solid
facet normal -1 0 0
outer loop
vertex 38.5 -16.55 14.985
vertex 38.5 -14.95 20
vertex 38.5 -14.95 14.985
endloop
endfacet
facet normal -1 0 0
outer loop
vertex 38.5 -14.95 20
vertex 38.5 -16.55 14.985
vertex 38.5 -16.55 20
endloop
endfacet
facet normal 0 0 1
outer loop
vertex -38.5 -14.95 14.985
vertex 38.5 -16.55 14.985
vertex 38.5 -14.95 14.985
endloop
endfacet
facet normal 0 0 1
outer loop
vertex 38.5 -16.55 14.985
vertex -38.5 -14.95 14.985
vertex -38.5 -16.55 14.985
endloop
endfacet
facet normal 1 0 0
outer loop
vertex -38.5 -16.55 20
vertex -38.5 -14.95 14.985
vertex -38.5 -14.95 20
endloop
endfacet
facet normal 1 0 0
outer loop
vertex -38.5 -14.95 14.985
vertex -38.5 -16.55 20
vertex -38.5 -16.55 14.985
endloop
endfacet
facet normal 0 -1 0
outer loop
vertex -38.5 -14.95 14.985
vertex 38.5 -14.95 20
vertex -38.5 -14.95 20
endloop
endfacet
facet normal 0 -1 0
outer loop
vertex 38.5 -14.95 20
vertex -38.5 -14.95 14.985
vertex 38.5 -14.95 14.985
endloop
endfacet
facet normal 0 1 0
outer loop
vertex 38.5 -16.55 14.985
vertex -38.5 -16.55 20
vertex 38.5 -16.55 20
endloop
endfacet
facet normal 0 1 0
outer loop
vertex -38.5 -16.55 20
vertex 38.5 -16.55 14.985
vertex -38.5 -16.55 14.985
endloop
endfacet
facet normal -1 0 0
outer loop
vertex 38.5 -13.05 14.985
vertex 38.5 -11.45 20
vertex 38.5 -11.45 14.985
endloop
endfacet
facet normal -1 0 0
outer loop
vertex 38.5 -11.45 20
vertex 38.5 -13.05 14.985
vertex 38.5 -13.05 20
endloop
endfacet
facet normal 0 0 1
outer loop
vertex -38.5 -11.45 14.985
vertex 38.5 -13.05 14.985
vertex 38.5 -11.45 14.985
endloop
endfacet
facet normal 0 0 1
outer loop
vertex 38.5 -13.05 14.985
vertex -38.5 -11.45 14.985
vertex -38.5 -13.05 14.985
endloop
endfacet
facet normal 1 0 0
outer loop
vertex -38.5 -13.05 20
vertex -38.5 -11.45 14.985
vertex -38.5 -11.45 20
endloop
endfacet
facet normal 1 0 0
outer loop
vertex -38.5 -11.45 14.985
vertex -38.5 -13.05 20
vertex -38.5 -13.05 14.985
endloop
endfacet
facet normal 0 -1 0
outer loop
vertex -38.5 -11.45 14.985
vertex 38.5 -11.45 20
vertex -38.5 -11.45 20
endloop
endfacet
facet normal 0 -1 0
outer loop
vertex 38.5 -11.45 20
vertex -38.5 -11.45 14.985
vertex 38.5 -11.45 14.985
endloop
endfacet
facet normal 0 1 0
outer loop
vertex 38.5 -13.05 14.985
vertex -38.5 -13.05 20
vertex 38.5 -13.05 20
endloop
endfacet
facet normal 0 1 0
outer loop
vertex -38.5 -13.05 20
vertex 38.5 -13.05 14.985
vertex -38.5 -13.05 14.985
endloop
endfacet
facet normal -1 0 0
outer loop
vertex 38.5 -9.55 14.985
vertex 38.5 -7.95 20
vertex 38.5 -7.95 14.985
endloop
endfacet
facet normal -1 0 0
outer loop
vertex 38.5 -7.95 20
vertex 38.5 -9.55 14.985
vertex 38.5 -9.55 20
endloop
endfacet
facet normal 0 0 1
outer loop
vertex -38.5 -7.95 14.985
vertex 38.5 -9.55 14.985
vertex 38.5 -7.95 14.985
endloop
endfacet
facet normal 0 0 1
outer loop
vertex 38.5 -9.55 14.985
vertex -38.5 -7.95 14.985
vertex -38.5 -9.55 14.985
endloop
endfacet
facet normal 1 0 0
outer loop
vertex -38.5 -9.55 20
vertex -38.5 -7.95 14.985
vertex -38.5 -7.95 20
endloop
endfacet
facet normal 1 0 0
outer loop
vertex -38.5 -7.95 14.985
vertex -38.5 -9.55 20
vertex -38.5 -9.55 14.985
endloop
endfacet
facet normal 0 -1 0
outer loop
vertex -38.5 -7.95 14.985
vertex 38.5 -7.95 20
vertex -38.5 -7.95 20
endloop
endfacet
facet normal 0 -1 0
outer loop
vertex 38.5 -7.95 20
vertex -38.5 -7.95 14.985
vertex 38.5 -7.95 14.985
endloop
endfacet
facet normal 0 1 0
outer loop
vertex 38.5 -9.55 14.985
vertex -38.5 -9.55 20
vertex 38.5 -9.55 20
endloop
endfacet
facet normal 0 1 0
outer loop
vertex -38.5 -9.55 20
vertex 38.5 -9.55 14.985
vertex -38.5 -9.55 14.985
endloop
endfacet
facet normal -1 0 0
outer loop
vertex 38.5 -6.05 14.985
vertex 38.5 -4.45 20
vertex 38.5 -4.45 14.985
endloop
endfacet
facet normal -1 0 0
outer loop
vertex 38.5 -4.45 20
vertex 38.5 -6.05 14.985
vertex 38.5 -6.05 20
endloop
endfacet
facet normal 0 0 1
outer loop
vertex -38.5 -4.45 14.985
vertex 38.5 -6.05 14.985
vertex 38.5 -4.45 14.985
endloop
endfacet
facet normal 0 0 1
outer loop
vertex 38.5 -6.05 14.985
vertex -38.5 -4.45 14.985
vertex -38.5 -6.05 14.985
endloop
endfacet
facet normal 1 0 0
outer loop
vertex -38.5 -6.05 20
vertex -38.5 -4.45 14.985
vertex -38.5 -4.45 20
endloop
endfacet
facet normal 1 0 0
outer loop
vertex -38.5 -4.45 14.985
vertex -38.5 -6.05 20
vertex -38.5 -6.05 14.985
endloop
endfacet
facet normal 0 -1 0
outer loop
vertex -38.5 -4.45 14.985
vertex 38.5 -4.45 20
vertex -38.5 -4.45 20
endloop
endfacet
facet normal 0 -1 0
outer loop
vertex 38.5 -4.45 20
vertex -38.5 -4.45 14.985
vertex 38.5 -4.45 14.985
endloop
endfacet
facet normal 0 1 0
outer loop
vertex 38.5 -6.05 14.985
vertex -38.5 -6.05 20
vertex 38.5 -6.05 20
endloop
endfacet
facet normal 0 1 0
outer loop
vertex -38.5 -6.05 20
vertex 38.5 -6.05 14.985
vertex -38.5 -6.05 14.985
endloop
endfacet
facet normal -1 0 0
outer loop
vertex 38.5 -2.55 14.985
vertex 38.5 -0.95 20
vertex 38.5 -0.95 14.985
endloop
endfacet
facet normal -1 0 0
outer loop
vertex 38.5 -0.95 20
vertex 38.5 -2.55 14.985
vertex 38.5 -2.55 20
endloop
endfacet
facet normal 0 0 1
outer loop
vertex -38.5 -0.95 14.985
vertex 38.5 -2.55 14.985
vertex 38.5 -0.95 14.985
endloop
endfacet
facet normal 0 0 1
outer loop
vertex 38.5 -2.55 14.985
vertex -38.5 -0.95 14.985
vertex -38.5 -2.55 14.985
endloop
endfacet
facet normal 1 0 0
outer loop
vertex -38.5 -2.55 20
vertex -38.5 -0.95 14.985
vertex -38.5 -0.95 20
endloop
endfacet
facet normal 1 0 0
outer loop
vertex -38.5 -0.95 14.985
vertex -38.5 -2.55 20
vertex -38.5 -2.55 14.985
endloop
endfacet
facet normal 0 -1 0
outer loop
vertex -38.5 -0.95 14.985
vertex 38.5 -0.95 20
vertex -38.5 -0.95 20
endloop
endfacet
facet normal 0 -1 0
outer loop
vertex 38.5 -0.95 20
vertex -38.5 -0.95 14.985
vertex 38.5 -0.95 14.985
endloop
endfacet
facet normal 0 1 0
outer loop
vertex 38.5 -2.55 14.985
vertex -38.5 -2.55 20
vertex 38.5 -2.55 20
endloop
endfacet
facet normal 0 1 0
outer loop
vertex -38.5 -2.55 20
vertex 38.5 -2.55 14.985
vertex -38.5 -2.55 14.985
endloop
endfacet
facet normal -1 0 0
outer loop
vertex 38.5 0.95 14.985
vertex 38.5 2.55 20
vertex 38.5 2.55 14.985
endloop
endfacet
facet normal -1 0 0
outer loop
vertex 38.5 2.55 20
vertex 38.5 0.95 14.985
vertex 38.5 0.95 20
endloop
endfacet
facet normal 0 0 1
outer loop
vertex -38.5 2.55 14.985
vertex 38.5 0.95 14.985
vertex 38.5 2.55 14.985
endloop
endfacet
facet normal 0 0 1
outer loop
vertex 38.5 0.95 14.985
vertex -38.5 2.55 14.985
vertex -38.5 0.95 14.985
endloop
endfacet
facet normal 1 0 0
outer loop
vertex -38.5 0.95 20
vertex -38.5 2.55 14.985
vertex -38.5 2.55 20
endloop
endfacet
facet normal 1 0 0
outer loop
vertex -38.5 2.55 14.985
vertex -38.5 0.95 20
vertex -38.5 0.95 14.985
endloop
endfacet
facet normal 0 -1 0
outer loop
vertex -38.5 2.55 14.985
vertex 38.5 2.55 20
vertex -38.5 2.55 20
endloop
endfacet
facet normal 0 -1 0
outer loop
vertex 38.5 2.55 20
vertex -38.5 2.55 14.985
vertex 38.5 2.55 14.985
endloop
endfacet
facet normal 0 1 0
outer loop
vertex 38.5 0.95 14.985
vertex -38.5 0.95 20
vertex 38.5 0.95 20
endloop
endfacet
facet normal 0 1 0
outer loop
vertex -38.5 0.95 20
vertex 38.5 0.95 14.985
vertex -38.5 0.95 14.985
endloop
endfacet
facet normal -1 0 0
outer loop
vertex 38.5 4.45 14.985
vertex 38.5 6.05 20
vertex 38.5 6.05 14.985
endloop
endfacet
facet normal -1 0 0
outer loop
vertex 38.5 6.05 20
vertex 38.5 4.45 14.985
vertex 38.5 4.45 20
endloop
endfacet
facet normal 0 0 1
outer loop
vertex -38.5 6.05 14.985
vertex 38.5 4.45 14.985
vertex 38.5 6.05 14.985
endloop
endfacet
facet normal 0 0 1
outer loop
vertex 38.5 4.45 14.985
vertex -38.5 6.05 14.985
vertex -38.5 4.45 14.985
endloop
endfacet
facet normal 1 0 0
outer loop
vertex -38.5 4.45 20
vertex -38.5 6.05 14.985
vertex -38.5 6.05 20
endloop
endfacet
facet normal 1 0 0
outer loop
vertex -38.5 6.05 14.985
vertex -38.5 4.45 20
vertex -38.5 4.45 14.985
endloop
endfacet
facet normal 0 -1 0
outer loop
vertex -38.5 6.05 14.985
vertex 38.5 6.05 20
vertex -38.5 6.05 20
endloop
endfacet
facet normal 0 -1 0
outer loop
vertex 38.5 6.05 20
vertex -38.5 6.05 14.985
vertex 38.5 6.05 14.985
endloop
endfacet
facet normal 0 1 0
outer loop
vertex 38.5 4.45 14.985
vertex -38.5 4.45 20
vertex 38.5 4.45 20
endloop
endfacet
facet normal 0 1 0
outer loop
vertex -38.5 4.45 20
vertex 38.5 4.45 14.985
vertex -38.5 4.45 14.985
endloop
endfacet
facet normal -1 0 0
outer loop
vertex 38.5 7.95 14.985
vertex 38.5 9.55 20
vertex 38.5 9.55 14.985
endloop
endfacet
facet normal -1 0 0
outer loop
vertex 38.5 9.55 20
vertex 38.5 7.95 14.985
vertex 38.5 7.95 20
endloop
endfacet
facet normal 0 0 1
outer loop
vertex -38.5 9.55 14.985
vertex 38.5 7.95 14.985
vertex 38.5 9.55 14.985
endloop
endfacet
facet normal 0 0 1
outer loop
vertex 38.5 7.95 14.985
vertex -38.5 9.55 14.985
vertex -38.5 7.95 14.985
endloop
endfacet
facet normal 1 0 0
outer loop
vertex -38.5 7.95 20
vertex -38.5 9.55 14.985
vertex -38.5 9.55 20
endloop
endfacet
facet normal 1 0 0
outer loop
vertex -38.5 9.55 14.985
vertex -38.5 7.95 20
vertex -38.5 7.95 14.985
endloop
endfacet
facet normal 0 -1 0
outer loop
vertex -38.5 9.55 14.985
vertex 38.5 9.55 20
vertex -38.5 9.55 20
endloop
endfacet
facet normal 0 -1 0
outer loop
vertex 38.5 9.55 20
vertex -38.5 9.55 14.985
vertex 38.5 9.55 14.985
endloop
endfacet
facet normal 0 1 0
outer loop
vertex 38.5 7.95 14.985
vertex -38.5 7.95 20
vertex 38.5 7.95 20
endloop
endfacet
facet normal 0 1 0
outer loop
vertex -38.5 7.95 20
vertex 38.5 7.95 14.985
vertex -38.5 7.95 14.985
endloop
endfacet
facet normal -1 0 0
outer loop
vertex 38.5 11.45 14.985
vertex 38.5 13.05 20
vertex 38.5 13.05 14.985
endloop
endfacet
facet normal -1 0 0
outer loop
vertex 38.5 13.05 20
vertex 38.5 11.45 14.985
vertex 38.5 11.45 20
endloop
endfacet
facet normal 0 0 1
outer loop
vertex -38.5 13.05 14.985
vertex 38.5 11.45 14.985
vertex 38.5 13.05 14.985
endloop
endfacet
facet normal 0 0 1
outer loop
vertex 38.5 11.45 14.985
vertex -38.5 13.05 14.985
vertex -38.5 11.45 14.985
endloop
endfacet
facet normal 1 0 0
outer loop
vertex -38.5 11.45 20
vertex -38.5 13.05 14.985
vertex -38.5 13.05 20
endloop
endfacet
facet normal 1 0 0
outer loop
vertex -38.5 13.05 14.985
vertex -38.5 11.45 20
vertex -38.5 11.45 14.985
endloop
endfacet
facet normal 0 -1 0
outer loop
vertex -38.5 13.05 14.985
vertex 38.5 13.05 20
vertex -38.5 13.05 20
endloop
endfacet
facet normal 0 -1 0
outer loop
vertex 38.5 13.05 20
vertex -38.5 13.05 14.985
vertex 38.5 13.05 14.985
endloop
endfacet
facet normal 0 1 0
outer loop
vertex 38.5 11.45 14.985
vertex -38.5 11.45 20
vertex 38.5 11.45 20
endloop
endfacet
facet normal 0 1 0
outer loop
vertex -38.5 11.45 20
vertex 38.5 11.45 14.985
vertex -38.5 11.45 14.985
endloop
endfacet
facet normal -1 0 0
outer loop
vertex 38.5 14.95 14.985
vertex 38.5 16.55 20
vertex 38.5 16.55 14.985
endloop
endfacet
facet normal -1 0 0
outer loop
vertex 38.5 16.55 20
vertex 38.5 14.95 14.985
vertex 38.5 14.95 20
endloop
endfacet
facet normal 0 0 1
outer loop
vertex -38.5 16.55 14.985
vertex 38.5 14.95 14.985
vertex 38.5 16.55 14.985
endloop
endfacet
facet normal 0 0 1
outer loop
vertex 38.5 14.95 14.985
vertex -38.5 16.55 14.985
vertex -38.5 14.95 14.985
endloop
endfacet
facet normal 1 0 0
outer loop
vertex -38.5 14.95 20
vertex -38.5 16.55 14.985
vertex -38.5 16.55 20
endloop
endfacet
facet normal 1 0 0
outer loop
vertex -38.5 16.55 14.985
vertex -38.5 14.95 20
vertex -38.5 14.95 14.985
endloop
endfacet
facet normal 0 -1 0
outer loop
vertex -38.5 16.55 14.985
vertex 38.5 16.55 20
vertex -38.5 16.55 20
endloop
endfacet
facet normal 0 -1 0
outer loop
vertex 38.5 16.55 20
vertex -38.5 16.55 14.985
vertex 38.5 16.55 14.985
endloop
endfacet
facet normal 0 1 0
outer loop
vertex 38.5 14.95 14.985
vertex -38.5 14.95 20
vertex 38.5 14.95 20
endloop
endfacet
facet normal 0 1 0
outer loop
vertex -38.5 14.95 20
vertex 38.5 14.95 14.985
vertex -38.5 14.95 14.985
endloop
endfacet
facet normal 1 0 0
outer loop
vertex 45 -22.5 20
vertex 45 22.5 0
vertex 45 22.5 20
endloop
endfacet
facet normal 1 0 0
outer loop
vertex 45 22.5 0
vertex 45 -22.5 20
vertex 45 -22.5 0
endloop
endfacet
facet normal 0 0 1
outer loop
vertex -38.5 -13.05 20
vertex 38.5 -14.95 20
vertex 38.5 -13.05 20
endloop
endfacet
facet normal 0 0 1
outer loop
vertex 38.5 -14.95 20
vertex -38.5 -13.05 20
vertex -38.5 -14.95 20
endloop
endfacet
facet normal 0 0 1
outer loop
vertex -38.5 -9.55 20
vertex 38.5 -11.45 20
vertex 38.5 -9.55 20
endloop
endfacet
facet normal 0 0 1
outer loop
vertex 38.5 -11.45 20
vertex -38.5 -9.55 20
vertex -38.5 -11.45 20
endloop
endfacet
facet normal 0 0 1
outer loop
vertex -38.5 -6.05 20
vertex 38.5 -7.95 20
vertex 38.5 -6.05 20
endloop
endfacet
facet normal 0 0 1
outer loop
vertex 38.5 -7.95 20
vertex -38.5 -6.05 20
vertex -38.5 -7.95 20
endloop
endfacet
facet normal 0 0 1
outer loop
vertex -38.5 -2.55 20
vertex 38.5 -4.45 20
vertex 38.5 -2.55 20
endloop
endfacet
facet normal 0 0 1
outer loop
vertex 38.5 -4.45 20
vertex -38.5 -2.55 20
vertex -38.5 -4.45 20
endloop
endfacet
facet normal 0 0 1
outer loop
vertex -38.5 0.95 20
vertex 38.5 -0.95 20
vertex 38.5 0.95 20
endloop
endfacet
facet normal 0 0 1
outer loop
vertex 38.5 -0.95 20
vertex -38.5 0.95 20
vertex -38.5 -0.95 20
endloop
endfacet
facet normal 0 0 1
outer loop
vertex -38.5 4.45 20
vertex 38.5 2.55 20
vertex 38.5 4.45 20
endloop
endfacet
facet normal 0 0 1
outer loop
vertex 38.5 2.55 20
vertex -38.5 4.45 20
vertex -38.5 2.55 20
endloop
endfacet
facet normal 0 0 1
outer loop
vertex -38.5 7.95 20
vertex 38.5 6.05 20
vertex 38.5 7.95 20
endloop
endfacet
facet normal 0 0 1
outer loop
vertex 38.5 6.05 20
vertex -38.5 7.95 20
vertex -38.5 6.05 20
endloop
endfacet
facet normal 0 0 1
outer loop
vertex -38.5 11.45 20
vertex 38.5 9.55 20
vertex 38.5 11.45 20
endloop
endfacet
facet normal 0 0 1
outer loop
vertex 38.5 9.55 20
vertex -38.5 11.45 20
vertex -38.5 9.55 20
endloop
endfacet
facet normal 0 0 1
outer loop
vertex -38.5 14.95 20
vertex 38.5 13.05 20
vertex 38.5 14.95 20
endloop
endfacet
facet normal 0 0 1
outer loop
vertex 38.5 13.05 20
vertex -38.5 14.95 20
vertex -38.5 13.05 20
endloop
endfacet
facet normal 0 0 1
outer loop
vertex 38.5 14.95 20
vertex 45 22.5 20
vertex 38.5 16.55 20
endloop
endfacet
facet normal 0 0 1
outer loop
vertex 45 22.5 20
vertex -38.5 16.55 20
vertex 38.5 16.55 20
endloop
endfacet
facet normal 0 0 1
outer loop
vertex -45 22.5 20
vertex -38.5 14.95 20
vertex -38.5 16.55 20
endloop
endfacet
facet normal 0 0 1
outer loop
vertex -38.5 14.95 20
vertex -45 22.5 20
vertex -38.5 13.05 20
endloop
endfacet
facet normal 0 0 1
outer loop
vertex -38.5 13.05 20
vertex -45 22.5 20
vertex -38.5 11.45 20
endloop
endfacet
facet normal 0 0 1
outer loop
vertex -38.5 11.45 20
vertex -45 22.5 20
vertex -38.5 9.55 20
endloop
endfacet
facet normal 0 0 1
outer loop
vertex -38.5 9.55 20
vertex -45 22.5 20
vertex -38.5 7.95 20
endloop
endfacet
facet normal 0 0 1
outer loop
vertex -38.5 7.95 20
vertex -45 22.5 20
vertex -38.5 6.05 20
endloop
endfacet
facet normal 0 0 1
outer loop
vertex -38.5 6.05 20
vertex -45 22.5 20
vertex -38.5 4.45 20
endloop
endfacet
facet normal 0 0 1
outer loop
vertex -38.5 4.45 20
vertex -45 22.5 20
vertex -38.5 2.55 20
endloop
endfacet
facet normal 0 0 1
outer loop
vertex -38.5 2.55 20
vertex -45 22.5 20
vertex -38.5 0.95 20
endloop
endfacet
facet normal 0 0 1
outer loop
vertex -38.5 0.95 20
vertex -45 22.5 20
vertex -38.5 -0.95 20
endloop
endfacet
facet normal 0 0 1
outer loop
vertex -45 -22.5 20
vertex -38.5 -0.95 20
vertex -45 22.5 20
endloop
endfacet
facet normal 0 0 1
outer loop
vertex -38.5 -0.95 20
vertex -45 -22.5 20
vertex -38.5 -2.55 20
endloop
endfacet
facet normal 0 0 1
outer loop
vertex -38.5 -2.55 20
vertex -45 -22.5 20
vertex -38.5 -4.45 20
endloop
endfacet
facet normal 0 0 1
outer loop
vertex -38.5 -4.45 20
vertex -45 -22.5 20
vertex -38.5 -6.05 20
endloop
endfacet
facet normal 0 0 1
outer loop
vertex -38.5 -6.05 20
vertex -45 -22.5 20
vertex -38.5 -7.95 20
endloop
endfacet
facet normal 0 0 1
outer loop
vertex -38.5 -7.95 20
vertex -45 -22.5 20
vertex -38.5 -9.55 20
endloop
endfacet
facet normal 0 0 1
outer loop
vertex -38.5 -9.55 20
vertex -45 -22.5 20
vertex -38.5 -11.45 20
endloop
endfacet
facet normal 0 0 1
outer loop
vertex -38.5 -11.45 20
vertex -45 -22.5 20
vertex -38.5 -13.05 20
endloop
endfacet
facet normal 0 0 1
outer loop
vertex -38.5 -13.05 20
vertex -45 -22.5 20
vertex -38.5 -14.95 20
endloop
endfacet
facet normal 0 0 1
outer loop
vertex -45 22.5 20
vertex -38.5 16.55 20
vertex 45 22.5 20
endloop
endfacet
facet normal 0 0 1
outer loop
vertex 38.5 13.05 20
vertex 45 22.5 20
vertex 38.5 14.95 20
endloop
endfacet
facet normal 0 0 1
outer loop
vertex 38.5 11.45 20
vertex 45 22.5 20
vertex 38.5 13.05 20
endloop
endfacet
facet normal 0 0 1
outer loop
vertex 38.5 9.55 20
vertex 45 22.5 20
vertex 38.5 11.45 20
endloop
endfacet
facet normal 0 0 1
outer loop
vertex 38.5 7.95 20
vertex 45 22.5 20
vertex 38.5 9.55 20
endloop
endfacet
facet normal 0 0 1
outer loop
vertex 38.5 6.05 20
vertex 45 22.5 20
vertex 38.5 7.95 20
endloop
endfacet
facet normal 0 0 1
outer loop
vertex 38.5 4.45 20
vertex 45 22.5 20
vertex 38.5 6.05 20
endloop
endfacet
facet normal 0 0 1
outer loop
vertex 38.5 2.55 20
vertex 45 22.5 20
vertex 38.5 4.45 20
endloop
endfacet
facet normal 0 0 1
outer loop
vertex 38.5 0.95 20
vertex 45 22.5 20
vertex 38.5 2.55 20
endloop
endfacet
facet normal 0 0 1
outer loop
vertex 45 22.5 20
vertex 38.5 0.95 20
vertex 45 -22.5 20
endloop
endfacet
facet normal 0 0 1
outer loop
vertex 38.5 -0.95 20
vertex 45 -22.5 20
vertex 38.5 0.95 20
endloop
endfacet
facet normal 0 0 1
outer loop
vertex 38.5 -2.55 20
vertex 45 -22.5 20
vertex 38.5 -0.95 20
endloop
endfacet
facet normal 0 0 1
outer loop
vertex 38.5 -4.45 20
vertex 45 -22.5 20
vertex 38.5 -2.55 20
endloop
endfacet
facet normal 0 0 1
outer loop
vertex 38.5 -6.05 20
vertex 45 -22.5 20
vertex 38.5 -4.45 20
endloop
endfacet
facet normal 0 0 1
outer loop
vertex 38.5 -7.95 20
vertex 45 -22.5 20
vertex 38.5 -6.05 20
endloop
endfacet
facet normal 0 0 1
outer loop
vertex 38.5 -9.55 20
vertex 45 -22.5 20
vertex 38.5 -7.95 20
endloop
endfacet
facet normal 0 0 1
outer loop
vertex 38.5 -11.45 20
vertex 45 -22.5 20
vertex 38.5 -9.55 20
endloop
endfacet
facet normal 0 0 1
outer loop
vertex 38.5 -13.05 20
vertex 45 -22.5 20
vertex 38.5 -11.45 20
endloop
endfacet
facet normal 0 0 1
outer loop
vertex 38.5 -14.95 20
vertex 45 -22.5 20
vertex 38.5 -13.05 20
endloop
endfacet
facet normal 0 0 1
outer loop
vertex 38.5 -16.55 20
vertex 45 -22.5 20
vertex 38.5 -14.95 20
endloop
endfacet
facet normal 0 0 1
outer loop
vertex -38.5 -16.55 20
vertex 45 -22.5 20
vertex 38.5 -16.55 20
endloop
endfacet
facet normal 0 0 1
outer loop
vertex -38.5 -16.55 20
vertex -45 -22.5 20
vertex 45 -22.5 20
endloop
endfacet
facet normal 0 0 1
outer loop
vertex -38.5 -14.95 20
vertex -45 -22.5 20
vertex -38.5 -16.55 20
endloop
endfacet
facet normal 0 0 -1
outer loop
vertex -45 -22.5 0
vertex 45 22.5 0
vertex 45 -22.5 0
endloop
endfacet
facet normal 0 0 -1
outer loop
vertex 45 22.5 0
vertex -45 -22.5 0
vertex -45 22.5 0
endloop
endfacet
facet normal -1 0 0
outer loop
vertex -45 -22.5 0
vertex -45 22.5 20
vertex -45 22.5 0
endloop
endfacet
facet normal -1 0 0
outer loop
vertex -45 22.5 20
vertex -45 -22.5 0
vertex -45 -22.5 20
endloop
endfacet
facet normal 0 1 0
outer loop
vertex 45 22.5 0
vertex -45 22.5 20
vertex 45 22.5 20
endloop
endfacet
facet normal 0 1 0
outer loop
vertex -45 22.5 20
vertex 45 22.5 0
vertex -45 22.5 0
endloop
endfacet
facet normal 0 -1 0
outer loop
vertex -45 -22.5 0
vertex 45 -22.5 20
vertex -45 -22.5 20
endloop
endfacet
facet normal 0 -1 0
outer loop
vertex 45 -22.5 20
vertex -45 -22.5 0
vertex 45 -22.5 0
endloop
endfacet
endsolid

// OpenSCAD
// --- Dimensions ---
// Microscope slide dimensions
slide_length = 75;    // mm (X direction of slide)
slide_width  = 25;    // mm (Y direction of slide)
slide_thick  = 1;     // mm (Z direction of slide)

// Base block dimensions
base_x = 90;          // mm (Length)
base_y = 45;          // mm (Width)
base_z = 20;          // mm (Height)

// Slot dimensions
slot_length = 77;     // mm (Runs along X)
slot_width  = 1.6;    // mm (Width in Y)
slot_depth  = 10;     // mm (Depth in Z)

// Slot layout
num_slots = 10;
slot_pitch = 3.5;     // mm (Centre-to-centre spacing in Y)

// --- Calculations ---
// Total width of the slot group
total_slot_width = (num_slots - 1) * slot_pitch;

// Y-centre of the slot group relative to the block centre (0,0)
// The group is centred on the block in Y.
slot_group_y_offset = 0;

// X-centre of the slot group relative to the block centre (0,0)
// The group is centred on the block in X.
slot_group_x_offset = 0;

// Slot positions
// We need to place 10 slots. The centres are spaced by 3.5mm.
// The middle of the group is at Y=0.
// For 10 slots (even number), the centres are at:
// +/- 1.75, +/- 5.25, +/- 8.75, ...
// Formula: y_i = (i - (num_slots-1)/2) * pitch, for i in 0..num_slots-1
// Let's verify:
// i=0: y = -4.5 * 3.5 = -15.75
// i=9: y = 4.5 * 3.5 = 15.75
// This centres the group around 0.

// --- Model ---
$fn = 64;

module base_block() {
    // Base block resting on XY plane, centred at origin
    translate([0, 0, base_z / 2]) {
        cube([base_x, base_y, base_z], center = true);
    }
}

module slot(x_offset, y_offset) {
    // Slot runs along X, is slot_width wide in Y, and slot_depth deep in Z.
    // Open at the top (Z = base_z).
    // We cut into the block from the top.
    // The slot is centred at (x_offset, y_offset) in XY.
    // Depth is slot_depth, so it goes from Z = base_z down to Z = base_z - slot_depth.
    // To ensure clean cuts, we extend slightly past the faces.
    
    // X extent: centred at x_offset, length slot_length
    // Y extent: centred at y_offset, width slot_width
    // Z extent: from base_z to base_z - slot_depth - 0.01 (to ensure cutting)
    
    translate([x_offset, y_offset, base_z - 0.01]) {
        // The slot is a rectangular prism cut into the block.
        // It is open at the top, so we don't need to worry about the top face.
        // We extend slightly in Z to ensure the bottom face is cut cleanly.
        cube([slot_length, slot_width, slot_depth + 0.01], center = true);
    }
}

module drying_rack() {
    difference() {
        base_block();
        
        for (i = [0 : num_slots - 1]) {
            // Calculate Y position for each slot
            y_pos = (i - (num_slots - 1) / 2) * slot_pitch;
            
            // X position is centred (0)
            x_pos = 0;
            
            slot(x_pos, y_pos);
        }
    }
}

drying_rack();
